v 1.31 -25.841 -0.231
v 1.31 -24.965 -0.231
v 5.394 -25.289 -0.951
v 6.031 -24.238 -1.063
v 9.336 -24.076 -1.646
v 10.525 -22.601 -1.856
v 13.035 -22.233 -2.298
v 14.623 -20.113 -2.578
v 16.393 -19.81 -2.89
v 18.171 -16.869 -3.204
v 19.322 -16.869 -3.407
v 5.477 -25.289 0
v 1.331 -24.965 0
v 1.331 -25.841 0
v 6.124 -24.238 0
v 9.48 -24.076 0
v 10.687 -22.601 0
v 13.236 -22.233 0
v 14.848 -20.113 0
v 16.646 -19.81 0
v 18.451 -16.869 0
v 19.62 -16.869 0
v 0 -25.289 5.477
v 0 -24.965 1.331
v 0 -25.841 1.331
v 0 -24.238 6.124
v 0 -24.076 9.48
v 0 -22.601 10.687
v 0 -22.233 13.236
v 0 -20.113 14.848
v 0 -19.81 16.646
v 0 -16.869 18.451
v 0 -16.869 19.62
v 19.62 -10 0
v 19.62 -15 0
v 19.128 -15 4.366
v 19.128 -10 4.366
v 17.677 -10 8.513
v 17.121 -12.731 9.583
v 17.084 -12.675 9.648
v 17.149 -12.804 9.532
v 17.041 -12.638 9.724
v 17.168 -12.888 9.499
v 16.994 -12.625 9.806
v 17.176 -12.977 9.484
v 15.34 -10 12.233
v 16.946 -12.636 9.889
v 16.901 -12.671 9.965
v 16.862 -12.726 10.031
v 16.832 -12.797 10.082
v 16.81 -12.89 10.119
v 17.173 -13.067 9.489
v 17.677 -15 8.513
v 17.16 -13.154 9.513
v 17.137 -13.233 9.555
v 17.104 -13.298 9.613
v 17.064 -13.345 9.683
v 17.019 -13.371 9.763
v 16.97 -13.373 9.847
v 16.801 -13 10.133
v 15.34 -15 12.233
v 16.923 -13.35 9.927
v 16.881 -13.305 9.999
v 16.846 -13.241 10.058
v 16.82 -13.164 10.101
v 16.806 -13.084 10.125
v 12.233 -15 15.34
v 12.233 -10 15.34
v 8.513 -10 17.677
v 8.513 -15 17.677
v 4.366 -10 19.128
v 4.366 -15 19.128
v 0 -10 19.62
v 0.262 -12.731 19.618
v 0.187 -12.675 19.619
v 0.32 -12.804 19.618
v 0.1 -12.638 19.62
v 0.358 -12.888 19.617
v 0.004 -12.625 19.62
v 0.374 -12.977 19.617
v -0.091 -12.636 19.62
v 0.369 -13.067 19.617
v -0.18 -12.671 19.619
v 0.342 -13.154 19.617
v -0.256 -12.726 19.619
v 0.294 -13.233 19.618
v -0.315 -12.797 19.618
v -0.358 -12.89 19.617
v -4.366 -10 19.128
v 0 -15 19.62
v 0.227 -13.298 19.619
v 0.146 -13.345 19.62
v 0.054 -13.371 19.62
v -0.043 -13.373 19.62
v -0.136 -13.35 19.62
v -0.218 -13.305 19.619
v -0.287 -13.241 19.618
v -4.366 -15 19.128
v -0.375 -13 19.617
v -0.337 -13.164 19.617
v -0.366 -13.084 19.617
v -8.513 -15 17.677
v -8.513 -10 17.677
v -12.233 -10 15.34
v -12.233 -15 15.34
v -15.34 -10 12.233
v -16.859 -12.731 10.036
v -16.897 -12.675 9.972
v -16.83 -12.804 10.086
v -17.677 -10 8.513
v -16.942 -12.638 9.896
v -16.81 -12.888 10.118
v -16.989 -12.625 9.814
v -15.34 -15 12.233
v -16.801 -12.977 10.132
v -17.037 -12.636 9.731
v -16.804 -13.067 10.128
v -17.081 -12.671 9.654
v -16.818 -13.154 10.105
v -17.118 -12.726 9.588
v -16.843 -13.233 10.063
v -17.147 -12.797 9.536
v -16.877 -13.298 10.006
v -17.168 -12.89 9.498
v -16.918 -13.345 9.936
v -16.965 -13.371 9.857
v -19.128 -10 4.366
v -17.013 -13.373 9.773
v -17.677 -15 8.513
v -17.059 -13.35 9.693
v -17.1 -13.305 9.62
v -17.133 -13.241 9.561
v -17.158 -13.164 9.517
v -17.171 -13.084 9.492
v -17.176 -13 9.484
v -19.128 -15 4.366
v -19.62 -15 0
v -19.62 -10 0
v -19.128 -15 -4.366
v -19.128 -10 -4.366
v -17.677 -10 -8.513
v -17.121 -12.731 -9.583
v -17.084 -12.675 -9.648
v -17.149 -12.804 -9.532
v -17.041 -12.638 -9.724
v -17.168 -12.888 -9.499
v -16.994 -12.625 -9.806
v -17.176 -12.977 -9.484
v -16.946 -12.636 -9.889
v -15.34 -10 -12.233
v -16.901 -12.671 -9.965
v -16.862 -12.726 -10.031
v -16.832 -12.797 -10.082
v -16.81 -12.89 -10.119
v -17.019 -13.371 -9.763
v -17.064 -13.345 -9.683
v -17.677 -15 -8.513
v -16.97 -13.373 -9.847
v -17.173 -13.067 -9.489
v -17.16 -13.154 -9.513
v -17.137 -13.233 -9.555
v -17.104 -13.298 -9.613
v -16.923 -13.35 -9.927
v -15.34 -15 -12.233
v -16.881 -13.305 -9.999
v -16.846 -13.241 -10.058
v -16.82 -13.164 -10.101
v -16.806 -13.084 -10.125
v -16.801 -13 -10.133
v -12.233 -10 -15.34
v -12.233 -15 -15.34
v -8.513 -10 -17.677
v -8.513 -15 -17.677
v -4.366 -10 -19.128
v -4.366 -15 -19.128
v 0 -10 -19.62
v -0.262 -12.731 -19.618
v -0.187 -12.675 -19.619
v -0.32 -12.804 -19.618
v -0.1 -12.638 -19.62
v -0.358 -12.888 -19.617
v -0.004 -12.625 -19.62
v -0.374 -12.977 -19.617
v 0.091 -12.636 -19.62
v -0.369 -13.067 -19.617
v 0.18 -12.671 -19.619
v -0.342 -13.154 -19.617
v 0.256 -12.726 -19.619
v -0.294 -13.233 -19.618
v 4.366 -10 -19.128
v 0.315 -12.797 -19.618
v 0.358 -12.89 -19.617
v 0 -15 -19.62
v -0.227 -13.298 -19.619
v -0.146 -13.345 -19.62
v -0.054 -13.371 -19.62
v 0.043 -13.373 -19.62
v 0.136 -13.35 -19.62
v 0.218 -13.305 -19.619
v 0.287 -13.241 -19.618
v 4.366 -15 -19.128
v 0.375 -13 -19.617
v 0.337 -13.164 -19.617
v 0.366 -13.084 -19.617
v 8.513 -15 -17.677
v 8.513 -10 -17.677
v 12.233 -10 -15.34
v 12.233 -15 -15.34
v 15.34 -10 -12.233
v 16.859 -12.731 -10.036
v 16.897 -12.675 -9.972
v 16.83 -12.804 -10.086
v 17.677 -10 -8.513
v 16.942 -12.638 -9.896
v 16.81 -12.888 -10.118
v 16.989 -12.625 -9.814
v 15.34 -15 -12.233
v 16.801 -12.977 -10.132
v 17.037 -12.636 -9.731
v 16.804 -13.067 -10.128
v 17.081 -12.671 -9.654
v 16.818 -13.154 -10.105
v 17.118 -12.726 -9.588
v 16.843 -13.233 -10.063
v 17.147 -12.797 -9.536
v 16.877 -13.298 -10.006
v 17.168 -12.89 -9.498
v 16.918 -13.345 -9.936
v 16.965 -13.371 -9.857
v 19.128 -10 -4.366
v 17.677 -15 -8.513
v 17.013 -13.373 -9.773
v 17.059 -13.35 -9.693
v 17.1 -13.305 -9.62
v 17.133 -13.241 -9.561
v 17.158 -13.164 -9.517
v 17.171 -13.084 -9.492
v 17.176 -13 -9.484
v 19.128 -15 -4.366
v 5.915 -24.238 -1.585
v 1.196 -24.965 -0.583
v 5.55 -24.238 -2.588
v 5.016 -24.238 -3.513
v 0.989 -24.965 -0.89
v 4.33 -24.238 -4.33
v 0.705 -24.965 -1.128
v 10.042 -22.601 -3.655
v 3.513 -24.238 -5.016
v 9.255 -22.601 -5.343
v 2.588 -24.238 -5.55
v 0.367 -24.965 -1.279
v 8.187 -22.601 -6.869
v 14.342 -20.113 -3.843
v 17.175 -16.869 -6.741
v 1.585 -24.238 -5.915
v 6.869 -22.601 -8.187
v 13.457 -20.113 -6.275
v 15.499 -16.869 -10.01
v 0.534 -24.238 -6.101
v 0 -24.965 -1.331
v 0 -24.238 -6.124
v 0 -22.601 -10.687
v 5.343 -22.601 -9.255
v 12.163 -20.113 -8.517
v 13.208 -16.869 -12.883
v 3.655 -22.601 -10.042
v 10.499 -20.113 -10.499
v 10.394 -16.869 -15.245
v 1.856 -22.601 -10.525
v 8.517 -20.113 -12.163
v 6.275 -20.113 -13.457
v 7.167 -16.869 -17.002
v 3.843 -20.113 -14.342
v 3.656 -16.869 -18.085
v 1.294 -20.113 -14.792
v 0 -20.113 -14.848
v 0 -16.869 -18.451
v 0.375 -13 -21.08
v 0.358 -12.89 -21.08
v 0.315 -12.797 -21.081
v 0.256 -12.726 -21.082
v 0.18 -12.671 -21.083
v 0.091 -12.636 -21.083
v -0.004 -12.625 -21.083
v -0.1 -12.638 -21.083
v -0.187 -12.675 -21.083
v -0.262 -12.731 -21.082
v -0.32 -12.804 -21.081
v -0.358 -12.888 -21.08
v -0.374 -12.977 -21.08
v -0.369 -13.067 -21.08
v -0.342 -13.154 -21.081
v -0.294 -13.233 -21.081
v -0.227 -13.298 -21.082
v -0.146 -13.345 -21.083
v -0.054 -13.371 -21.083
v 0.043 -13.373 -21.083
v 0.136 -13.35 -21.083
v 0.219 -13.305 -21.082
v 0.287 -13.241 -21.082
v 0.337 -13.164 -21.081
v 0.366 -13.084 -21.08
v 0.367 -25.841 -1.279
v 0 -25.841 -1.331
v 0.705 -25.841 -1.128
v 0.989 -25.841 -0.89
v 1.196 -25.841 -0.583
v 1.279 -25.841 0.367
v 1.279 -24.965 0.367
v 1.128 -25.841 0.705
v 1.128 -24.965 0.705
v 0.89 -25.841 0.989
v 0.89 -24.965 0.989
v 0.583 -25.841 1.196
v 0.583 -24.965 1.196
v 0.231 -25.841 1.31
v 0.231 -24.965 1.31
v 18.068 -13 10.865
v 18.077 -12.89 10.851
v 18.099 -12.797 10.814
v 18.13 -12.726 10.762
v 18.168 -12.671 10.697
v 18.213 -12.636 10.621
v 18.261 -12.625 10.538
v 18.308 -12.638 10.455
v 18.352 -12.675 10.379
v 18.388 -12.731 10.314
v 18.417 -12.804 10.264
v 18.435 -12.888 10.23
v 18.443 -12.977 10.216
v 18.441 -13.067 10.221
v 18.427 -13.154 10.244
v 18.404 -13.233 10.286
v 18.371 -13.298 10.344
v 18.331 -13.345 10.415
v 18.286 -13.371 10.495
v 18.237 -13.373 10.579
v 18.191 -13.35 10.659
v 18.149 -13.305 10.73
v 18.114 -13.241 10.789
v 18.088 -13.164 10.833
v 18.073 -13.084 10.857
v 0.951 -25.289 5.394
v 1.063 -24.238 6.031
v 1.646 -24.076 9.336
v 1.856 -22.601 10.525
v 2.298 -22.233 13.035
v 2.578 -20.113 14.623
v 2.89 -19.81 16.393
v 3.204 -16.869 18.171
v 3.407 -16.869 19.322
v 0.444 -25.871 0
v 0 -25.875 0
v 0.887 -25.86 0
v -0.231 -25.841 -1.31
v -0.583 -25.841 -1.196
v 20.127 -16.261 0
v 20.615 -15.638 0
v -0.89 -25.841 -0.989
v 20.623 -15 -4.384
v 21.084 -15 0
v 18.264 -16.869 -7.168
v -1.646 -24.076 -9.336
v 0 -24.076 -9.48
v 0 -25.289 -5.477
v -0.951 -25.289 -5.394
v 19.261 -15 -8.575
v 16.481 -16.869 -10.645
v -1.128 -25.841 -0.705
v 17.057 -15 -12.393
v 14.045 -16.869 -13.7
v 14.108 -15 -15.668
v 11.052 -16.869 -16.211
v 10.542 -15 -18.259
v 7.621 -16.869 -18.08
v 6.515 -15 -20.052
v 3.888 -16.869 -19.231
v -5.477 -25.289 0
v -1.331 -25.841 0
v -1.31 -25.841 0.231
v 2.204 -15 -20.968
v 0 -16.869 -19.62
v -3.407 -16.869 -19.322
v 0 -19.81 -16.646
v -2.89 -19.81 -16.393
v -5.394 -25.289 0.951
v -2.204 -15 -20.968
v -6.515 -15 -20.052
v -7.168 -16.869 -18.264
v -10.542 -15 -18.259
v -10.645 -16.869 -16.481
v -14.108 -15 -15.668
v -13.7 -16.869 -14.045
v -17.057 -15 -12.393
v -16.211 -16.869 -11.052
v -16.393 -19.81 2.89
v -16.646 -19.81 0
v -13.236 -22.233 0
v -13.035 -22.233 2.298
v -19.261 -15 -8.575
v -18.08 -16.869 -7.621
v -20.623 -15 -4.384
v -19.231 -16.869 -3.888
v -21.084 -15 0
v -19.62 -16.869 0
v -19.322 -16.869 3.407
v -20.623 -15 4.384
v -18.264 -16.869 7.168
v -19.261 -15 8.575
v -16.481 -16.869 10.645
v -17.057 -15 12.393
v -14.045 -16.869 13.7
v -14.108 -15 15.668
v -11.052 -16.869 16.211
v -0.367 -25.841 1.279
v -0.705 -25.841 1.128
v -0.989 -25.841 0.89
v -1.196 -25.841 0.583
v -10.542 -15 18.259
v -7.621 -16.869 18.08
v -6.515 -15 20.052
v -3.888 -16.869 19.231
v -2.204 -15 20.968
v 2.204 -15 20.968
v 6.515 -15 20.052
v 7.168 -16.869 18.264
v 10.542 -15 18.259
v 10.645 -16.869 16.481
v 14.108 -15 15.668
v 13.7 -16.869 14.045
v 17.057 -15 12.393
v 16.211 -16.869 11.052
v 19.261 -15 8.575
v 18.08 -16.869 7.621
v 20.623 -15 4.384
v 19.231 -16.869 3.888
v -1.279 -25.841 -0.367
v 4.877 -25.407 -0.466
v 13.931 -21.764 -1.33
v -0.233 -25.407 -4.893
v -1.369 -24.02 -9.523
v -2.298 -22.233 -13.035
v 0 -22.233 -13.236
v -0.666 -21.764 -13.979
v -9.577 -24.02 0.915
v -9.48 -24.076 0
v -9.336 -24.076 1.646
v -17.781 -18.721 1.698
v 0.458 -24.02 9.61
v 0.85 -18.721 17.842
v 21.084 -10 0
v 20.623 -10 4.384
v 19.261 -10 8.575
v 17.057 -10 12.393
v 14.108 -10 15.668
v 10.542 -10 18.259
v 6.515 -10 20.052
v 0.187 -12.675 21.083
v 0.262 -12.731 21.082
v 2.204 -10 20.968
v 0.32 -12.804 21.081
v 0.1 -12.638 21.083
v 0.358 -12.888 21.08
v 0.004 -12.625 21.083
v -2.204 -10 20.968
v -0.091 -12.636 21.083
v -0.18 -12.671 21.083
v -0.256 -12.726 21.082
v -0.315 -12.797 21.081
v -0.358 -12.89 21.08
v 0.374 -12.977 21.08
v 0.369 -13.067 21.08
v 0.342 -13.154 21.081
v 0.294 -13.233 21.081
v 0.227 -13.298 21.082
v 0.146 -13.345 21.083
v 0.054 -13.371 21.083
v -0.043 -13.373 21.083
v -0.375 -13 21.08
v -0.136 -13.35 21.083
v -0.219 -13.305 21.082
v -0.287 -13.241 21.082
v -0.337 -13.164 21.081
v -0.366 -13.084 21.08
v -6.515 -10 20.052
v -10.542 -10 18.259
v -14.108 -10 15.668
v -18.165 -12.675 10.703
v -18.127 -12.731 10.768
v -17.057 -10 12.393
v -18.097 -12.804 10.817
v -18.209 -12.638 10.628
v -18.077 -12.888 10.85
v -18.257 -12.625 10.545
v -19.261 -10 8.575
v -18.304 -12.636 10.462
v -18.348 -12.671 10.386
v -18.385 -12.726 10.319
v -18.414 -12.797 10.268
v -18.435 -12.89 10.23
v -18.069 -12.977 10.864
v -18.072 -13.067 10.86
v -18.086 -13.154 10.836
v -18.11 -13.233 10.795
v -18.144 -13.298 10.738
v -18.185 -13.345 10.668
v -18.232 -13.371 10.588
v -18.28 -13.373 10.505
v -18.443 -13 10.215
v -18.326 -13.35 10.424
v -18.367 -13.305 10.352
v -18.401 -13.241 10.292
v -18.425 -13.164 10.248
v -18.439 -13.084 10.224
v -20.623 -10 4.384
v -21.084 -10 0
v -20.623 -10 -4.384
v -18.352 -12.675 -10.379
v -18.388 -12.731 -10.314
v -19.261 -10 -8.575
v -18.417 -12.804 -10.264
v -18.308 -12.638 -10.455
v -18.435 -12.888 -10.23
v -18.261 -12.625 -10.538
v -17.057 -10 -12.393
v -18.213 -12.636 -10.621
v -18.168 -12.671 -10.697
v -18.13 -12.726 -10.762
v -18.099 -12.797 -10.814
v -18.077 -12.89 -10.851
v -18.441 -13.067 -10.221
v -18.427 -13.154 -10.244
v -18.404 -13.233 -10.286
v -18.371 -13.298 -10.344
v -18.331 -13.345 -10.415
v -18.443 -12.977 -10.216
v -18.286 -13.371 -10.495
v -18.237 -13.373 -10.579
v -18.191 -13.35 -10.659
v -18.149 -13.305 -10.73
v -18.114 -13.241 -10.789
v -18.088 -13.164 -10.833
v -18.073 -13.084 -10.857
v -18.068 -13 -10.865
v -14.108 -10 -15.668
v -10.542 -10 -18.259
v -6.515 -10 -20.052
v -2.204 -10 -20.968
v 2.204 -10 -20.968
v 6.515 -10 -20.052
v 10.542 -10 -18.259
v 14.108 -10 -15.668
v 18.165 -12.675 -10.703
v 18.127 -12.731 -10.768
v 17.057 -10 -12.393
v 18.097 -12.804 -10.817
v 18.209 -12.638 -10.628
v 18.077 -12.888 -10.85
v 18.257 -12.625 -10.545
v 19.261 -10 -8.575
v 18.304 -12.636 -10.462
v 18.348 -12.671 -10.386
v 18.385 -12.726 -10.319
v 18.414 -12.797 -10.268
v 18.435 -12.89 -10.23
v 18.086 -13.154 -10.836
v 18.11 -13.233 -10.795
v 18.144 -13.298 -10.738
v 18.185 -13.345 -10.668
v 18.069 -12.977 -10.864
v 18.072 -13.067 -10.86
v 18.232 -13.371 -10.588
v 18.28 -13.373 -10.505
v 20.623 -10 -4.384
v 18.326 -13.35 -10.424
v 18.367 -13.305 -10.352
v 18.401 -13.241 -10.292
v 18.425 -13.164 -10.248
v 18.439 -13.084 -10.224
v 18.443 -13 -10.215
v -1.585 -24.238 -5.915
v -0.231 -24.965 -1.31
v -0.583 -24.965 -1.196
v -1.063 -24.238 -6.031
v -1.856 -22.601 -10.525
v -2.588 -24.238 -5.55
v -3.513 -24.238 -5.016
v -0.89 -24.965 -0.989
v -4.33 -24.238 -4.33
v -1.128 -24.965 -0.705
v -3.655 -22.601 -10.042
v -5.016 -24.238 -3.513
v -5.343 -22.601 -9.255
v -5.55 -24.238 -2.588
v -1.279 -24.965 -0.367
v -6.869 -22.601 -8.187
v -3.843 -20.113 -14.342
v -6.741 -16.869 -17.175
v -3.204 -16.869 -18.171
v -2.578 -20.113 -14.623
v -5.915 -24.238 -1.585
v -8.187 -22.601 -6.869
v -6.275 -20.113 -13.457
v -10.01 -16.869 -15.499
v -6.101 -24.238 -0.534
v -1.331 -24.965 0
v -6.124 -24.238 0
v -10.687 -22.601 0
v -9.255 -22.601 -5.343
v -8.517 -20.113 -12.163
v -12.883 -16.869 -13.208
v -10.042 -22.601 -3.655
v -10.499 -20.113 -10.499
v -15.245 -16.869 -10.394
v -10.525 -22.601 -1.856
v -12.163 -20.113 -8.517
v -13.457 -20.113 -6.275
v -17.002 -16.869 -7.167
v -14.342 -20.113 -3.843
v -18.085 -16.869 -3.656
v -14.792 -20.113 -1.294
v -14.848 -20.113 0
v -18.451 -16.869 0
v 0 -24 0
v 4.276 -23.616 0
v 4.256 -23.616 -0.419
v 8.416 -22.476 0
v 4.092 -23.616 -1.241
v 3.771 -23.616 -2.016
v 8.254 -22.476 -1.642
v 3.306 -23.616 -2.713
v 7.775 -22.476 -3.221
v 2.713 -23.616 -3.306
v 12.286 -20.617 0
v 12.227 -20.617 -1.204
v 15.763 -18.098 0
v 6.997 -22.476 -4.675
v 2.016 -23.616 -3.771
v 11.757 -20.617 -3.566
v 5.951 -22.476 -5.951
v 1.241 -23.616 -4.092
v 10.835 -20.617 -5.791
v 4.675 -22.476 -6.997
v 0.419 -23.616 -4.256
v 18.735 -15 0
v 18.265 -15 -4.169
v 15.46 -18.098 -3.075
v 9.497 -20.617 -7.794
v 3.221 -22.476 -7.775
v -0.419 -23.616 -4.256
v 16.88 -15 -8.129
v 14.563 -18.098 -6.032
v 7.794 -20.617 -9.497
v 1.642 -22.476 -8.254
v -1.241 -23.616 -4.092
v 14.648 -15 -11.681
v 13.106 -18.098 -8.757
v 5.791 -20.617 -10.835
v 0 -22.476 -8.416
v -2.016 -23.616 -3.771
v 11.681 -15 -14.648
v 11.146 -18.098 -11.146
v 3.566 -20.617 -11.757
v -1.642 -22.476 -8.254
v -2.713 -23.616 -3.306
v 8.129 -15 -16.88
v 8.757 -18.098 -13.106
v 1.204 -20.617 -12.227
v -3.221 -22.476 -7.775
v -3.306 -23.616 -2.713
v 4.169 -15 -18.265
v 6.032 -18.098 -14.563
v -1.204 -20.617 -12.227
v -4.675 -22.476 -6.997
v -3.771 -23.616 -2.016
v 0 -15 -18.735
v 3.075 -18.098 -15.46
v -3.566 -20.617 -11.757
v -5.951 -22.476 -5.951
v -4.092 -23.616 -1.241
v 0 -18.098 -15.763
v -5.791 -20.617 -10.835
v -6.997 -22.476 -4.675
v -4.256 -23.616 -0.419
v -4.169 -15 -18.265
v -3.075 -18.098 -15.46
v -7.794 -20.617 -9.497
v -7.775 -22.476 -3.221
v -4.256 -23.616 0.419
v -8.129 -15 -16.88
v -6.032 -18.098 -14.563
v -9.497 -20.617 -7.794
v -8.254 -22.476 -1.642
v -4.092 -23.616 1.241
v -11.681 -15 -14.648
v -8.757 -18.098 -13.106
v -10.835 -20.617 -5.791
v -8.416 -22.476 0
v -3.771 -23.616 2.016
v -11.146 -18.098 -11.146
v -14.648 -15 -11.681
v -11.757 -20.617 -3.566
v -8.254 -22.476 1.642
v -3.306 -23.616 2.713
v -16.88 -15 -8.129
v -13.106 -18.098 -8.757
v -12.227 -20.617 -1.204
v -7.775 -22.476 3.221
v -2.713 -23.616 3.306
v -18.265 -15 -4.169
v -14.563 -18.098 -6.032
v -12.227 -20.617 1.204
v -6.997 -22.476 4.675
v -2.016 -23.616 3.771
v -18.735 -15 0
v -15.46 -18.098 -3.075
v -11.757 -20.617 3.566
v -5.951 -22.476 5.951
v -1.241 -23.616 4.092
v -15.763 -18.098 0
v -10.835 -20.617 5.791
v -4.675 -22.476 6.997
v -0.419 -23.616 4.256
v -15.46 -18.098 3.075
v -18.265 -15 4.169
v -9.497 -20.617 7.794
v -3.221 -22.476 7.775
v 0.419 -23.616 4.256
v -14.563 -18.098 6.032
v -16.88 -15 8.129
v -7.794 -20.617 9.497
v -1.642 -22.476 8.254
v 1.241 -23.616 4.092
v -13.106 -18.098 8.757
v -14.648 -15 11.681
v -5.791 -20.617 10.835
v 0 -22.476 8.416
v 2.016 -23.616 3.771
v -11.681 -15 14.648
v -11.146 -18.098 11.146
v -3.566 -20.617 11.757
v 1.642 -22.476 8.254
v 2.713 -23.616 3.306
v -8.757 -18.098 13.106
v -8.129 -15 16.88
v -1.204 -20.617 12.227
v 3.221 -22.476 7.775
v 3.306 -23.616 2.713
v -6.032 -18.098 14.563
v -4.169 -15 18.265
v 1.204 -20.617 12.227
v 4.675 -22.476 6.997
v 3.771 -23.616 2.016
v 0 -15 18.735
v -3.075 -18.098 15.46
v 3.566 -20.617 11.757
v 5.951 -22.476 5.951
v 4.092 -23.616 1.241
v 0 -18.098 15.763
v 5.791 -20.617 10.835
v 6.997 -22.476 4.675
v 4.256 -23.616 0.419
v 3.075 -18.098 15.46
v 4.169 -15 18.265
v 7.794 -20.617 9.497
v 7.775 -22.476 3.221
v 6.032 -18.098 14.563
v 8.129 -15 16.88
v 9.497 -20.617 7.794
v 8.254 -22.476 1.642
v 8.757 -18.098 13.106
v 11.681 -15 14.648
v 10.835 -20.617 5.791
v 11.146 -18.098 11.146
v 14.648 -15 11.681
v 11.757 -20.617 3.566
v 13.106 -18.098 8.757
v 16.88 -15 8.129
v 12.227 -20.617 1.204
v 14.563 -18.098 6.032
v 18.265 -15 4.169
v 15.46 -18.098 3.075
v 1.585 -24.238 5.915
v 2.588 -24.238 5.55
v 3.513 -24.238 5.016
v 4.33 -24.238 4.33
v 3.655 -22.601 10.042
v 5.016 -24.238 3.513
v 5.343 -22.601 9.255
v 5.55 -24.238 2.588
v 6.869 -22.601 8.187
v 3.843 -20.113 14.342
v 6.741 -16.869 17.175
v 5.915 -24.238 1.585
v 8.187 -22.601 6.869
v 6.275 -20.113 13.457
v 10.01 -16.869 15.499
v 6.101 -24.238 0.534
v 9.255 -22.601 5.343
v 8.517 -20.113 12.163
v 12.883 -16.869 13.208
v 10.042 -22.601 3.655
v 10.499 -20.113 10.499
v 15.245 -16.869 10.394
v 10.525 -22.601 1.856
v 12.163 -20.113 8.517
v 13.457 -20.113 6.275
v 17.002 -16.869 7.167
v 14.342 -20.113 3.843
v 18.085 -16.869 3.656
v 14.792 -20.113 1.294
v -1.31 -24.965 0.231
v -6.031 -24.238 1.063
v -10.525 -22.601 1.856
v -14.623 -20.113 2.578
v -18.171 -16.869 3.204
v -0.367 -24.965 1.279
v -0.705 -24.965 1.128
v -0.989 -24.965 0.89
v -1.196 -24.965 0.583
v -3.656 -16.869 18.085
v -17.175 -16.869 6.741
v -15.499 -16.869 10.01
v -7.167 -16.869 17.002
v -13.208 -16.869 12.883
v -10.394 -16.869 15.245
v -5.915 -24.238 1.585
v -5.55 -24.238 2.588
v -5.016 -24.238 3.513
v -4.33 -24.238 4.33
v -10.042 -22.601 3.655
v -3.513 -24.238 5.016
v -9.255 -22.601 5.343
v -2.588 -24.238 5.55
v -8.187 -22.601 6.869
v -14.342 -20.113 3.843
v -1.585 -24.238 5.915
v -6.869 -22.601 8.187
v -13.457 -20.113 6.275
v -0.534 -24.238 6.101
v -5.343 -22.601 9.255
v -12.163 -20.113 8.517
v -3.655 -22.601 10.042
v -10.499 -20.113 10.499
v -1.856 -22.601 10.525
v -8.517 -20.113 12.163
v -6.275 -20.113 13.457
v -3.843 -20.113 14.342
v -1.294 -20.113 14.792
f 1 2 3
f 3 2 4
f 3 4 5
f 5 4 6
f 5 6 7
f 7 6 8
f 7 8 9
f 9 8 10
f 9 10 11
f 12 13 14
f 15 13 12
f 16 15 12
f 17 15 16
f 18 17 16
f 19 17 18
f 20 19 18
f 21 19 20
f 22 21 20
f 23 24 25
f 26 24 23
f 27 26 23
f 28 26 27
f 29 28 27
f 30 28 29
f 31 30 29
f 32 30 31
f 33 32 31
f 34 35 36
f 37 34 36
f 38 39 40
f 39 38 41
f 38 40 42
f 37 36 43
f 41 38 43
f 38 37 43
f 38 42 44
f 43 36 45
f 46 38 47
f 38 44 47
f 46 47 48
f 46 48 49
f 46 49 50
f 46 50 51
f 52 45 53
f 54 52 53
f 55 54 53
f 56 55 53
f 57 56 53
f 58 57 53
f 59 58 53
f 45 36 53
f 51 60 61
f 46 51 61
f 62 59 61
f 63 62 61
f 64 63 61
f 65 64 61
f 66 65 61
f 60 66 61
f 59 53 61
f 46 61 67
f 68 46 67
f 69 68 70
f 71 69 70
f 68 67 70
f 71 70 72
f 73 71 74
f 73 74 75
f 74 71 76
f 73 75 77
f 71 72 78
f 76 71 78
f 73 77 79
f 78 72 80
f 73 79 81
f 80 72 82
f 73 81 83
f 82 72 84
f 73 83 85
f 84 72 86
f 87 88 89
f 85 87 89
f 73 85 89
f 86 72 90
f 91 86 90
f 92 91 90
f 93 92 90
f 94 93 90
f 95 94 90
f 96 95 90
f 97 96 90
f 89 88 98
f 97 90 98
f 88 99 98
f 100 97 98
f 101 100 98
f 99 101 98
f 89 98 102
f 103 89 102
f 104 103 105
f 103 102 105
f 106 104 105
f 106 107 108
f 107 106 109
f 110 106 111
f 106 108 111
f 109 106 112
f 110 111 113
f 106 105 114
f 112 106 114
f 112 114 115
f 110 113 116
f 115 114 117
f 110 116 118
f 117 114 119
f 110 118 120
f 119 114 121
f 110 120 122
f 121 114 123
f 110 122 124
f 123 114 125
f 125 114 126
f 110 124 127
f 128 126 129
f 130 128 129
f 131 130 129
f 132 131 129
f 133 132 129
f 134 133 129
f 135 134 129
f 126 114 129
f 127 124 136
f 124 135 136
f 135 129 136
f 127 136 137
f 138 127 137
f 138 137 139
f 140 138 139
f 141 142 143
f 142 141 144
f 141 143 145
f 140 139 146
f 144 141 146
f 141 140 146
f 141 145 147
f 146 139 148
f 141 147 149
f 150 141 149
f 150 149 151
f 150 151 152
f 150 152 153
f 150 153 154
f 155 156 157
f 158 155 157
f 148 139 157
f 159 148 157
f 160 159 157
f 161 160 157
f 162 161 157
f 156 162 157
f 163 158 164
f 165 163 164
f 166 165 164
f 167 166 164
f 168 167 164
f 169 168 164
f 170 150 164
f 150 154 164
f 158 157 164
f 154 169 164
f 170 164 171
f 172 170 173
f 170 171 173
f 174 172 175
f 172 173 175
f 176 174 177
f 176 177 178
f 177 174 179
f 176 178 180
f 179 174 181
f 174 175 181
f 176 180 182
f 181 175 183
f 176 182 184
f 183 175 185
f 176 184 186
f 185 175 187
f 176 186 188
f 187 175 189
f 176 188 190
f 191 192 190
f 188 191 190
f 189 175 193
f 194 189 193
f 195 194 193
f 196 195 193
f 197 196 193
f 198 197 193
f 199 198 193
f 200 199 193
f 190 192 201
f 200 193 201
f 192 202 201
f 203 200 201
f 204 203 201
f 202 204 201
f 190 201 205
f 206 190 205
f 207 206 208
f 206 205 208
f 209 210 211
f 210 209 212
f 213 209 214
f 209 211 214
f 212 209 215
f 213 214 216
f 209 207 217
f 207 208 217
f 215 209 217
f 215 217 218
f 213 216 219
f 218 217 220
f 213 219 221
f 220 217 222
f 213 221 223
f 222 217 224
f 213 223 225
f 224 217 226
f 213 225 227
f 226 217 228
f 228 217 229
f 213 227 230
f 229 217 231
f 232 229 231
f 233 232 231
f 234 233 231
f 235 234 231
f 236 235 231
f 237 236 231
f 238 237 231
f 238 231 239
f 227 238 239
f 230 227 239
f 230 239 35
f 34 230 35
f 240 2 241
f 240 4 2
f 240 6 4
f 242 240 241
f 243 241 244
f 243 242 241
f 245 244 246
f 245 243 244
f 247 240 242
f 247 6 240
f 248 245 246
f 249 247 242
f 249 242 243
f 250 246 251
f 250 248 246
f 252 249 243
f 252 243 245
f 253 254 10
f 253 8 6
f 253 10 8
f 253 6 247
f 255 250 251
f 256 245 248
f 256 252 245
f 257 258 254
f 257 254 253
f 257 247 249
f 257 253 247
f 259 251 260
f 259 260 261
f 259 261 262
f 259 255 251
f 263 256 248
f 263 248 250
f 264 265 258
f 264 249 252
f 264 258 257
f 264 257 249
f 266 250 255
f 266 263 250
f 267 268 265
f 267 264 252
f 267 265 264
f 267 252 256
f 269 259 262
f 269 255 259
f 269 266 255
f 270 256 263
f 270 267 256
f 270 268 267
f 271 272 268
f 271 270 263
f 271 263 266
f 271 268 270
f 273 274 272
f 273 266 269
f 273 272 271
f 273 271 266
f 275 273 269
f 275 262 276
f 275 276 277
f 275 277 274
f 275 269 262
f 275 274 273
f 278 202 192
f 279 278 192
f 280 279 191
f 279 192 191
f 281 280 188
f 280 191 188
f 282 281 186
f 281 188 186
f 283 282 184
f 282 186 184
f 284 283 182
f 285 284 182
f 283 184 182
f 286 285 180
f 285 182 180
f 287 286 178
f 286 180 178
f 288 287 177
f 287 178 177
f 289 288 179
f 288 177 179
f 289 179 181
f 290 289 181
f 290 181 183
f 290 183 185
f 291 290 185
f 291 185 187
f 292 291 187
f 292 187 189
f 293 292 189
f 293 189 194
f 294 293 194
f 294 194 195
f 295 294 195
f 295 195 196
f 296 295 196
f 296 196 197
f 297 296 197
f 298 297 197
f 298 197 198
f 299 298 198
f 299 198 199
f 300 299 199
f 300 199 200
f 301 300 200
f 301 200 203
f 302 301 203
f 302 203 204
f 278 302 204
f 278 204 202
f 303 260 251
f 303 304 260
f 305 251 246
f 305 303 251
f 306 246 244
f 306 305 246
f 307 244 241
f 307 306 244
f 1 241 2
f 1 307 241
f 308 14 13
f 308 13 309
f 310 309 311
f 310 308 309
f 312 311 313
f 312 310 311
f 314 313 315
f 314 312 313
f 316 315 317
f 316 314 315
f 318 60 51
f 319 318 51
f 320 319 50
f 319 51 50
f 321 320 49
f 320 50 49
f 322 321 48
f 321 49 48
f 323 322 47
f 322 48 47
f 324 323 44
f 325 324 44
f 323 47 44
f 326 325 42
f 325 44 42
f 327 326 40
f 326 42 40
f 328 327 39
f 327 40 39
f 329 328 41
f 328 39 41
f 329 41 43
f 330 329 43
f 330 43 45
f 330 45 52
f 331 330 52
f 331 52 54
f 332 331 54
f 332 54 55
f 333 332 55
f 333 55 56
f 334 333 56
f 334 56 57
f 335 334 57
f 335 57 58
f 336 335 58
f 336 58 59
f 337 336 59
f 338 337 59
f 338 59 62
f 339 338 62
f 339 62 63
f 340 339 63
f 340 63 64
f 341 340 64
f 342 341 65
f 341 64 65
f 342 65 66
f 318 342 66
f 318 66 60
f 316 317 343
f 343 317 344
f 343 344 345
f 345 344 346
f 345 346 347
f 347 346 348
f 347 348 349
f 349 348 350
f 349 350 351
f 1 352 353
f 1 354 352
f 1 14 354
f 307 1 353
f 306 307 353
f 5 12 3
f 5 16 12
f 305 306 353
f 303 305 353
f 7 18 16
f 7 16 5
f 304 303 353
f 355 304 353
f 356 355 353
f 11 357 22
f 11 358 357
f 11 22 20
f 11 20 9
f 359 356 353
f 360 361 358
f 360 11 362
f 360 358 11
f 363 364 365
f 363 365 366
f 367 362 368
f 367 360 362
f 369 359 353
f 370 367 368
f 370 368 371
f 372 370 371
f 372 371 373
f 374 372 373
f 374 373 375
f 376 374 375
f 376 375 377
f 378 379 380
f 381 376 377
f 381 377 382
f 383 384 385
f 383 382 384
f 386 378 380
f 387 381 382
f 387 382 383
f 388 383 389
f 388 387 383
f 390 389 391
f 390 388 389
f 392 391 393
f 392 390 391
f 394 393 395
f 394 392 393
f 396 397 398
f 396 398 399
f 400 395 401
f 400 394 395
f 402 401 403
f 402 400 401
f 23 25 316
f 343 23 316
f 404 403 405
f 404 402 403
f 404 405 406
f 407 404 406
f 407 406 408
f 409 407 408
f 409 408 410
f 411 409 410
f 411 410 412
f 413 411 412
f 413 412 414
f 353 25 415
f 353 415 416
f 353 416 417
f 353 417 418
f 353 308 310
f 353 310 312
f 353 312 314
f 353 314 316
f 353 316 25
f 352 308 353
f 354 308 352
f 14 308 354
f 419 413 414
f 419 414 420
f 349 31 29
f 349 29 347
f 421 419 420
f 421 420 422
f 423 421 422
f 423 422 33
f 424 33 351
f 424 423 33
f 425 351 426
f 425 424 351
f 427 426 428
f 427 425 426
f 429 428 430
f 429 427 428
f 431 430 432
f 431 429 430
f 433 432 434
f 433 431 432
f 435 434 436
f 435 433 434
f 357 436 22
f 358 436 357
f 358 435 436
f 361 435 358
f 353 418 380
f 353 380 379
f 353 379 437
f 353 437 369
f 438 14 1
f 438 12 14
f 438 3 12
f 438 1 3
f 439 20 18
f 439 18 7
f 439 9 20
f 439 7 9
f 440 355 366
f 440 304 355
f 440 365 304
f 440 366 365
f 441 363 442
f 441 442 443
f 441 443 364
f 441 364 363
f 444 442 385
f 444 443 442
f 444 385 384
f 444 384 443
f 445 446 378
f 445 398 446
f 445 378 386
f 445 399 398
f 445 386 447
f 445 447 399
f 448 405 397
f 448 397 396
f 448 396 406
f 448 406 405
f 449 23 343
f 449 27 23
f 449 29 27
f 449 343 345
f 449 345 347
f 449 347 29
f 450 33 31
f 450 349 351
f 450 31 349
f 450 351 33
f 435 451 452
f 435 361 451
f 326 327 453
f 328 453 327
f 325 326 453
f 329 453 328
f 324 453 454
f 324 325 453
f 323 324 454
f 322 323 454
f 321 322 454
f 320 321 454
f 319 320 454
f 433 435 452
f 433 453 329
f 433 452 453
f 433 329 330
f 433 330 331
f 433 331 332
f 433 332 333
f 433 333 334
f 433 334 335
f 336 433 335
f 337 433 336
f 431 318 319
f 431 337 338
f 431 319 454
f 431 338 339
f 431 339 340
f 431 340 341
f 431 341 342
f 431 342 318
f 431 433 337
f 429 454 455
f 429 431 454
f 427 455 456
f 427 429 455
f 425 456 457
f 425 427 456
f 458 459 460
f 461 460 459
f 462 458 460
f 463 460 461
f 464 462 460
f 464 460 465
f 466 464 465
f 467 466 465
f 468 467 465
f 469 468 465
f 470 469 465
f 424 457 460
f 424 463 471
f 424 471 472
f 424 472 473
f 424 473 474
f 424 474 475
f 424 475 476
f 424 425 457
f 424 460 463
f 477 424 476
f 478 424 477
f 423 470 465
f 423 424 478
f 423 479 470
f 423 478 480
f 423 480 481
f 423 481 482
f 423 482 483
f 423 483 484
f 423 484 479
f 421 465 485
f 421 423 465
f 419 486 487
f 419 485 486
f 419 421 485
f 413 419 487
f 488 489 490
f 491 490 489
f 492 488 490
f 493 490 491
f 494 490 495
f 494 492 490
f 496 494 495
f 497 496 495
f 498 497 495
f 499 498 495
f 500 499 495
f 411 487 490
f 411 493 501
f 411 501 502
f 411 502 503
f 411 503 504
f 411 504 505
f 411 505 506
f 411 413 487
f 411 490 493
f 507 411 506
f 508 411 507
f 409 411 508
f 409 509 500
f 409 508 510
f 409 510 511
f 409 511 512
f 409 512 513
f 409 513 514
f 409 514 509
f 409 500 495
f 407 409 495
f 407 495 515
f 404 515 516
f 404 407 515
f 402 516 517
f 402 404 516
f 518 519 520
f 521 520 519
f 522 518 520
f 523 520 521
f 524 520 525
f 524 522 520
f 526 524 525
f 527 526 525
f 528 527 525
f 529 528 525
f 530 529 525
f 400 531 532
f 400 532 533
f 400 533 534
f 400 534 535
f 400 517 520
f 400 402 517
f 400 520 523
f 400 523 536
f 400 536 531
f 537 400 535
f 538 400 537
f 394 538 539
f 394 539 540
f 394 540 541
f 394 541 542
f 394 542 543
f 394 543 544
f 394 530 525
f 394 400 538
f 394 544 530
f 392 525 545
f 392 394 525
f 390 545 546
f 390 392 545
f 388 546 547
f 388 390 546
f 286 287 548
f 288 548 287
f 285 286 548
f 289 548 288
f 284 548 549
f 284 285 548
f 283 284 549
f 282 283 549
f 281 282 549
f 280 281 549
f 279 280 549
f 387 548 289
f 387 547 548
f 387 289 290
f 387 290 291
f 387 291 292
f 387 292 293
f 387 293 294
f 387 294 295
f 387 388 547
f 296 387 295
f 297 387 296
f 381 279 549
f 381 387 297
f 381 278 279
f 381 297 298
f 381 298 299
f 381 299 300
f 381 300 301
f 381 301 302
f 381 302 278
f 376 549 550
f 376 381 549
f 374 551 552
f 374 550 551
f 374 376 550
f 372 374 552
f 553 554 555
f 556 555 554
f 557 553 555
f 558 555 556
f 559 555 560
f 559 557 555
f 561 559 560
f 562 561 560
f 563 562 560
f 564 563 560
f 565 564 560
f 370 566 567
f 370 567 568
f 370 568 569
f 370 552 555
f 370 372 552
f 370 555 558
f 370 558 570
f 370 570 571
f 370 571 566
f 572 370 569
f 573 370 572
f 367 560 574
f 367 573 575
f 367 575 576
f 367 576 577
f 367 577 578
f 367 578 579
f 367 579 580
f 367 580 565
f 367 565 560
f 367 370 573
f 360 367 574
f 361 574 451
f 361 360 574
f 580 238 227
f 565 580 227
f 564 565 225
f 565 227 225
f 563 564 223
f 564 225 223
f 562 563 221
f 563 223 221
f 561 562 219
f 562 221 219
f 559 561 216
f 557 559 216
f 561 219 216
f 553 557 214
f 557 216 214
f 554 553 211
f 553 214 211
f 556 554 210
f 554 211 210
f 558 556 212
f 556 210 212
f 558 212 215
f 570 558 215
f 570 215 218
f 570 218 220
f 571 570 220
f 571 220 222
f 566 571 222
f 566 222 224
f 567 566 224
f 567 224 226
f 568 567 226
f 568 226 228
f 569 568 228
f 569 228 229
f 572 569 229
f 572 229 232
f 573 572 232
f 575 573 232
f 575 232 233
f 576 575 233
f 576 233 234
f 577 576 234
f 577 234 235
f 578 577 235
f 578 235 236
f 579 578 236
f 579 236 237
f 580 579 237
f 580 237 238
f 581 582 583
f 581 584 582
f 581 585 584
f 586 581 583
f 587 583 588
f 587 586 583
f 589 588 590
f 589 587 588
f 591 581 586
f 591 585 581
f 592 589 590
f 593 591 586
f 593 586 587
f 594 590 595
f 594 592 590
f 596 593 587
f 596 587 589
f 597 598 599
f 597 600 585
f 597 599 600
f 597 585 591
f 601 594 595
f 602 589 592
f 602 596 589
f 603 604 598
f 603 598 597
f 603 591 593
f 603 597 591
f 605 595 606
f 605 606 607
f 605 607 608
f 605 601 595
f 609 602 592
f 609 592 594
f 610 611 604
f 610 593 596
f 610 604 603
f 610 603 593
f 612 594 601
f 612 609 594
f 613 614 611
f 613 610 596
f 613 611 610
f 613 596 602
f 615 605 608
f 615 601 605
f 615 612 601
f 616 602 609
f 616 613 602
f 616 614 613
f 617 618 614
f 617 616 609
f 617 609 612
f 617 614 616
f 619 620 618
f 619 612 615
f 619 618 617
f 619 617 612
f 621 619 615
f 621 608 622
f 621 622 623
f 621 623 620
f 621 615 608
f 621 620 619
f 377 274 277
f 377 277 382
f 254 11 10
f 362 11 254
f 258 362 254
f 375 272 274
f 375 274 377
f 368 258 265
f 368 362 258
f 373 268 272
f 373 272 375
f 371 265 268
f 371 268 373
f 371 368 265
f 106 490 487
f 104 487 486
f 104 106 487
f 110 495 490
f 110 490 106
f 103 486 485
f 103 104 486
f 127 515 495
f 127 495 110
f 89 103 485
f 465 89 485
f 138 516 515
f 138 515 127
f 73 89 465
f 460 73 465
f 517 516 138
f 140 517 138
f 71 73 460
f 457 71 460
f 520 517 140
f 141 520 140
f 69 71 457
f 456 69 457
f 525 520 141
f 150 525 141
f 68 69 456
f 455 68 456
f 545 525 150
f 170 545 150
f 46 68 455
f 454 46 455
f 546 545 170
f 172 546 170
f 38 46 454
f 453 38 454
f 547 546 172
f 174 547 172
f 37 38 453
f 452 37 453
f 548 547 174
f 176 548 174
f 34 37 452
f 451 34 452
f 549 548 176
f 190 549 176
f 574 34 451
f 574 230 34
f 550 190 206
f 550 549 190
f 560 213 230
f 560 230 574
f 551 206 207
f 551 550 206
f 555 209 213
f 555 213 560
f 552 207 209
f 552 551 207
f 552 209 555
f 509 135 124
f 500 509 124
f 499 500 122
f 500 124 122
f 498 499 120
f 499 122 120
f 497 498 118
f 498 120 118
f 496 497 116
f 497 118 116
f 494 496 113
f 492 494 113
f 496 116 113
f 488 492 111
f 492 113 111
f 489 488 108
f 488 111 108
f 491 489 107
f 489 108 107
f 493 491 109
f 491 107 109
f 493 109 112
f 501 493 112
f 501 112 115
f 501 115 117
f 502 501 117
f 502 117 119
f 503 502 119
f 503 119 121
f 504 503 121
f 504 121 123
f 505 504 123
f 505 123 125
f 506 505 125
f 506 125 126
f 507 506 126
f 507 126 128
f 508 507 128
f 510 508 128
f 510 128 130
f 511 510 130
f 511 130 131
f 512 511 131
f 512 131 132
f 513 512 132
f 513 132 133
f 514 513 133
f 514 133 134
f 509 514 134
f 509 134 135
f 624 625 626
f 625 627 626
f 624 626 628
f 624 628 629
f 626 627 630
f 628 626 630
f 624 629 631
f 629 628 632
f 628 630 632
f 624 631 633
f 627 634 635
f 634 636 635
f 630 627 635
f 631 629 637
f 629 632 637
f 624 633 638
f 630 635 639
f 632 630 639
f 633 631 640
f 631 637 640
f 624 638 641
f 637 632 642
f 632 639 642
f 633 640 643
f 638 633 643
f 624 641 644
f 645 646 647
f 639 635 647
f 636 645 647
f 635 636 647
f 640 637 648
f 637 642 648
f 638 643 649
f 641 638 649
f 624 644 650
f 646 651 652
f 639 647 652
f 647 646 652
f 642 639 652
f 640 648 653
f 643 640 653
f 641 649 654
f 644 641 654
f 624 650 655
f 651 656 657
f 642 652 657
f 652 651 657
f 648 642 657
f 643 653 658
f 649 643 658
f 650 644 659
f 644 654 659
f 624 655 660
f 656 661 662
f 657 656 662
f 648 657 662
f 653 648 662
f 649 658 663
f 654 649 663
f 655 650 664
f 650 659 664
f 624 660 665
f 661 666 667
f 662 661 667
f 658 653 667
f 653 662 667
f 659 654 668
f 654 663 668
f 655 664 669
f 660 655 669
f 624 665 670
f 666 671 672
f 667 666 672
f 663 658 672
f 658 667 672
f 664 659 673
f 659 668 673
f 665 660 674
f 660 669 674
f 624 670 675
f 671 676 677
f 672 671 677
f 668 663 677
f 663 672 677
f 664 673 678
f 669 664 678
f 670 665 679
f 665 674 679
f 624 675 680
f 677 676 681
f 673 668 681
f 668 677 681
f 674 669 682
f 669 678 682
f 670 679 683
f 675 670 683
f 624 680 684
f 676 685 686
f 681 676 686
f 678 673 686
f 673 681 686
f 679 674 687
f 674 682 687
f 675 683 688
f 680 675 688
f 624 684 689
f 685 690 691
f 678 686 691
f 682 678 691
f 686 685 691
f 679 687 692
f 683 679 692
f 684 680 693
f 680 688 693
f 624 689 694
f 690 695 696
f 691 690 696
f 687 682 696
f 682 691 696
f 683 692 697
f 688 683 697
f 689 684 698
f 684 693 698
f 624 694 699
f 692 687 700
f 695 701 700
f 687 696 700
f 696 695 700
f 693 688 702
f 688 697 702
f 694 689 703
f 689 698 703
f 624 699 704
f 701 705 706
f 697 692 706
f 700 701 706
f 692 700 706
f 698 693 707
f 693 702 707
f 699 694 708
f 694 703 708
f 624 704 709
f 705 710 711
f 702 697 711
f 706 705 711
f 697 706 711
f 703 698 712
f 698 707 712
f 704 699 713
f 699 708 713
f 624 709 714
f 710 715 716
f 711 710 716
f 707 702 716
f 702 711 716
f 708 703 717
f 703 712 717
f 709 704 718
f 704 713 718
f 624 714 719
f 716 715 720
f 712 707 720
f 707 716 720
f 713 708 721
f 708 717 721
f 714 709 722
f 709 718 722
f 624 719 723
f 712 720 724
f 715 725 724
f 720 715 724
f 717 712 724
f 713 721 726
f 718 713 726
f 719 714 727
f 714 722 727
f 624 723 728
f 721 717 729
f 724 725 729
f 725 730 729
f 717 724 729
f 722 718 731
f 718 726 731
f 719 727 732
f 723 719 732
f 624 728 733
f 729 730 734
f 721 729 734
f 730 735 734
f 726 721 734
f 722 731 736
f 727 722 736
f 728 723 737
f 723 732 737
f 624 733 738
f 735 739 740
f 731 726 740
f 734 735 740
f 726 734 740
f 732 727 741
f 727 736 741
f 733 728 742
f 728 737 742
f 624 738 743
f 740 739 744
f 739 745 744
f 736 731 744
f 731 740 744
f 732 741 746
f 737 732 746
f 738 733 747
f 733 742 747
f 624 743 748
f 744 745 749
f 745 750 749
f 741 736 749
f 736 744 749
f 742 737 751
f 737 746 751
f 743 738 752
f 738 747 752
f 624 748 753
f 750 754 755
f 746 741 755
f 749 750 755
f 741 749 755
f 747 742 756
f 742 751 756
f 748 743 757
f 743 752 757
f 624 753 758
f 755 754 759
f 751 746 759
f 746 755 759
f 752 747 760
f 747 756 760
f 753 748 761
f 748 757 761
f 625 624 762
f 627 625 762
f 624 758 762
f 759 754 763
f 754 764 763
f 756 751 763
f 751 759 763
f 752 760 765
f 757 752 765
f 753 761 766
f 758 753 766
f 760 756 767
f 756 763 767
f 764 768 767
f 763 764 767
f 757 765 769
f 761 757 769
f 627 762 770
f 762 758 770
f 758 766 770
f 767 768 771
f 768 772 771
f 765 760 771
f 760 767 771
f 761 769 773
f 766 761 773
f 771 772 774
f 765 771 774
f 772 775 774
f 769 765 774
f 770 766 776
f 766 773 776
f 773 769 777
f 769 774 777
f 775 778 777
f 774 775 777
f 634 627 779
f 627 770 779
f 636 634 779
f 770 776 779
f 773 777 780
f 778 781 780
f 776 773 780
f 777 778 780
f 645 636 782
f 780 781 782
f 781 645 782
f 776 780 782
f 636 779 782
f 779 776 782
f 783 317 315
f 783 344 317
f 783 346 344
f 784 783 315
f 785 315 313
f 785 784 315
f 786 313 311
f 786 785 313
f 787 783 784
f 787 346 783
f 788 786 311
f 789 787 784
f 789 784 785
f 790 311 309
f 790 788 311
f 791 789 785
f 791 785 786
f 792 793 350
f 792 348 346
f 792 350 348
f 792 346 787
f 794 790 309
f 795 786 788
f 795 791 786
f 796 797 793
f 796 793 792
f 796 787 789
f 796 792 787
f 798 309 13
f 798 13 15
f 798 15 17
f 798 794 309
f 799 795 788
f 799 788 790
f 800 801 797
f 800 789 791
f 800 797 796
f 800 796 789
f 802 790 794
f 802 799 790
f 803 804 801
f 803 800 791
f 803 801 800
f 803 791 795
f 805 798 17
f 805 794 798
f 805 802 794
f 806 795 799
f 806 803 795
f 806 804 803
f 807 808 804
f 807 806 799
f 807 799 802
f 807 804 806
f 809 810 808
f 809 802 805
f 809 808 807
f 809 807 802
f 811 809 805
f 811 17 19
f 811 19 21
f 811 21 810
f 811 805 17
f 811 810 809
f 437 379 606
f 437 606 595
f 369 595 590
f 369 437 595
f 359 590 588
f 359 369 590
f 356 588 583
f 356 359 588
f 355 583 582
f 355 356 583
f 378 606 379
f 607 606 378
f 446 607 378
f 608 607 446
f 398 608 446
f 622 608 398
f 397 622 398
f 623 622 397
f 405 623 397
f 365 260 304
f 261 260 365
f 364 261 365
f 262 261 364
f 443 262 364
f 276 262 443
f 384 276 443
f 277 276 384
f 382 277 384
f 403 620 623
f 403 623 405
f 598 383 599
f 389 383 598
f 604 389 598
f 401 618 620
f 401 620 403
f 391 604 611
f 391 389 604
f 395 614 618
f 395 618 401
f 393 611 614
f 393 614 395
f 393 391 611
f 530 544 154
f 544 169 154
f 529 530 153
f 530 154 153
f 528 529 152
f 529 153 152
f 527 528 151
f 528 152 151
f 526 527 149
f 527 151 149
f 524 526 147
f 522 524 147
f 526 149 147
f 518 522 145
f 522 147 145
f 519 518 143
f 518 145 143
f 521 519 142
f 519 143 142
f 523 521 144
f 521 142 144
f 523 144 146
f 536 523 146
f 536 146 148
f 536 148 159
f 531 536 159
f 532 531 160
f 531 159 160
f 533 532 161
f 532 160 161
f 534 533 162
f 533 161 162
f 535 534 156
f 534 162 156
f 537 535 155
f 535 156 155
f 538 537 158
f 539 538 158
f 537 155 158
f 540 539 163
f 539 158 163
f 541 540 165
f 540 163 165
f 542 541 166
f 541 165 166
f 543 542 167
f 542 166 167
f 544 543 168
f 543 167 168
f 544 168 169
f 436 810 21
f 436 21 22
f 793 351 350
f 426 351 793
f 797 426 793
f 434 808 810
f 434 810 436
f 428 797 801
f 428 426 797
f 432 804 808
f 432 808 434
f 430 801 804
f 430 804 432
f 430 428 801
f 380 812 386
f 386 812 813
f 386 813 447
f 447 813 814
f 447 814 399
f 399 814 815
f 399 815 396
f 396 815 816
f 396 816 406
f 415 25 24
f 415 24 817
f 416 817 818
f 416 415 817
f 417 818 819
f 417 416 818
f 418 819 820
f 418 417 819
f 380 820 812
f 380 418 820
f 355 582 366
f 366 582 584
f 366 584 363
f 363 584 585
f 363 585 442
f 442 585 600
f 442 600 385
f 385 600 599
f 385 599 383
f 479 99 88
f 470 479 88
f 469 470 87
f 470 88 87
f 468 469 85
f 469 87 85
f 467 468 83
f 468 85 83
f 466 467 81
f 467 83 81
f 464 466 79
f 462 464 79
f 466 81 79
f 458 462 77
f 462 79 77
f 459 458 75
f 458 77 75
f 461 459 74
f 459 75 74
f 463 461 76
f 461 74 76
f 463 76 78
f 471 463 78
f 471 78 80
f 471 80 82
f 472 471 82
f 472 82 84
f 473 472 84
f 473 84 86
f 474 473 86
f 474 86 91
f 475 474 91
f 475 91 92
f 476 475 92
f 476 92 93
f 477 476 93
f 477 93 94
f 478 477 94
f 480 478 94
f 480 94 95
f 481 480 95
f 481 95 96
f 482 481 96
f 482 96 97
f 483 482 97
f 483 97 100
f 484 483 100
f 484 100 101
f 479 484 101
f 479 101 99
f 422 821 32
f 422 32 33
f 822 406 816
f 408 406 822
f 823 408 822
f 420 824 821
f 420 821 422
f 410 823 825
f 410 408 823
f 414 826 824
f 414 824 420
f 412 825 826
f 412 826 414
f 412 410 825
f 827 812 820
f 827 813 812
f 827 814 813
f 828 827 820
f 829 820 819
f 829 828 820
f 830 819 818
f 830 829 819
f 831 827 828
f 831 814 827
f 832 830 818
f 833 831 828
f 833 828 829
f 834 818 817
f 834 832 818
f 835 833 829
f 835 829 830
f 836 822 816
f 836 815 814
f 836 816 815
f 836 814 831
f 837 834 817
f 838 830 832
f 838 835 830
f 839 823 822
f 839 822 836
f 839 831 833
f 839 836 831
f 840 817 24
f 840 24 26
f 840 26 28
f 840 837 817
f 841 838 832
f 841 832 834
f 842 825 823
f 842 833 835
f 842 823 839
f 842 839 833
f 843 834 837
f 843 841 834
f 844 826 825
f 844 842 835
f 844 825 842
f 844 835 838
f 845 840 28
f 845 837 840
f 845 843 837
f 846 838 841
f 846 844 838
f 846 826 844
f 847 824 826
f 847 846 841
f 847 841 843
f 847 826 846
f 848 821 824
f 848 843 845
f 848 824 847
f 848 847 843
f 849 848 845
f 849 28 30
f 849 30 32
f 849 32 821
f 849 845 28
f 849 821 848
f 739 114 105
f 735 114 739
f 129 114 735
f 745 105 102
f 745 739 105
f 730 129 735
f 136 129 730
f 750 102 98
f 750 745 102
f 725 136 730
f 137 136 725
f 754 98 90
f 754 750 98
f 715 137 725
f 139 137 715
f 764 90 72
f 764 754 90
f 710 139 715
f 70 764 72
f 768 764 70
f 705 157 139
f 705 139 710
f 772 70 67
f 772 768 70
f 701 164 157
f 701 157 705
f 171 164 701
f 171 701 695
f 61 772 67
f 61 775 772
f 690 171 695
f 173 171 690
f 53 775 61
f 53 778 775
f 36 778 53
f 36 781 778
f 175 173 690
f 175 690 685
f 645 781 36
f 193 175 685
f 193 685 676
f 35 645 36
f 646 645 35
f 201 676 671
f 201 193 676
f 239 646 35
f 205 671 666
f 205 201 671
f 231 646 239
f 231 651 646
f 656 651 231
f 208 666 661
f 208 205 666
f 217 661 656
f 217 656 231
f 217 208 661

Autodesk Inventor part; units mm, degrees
ref_plane "YZ Plane" through (0, 0, 0) normal (1, 0, 0) x (0, 1, 0)
ref_plane "XZ Plane" through (0, 0, 0) normal (0, 1, 0) x (-1, 0, 0)
ref_plane "XY Plane" through (0, 0, 0) normal (0, 0, 1) x (1, 0, 0)
sketch "Sketch2" plane through (0, 0, 0) normal (0, 0, 1) x (1, 0, 0)
  circle A0 centre (0, 0) radius 25
  circle A1 centre (0, 0) radius 24
  line L0 (-28.1544, -15) -> (30.7149, -15)
  line L1 (0, -25) -> (0, -24)
  point P0 (20, -15)
  point P1 (18.735, -15)
  dimension "d3" = 50
  dimension "d4" = 48
  dimension "d6" = 10
revolve "Revolution1" add sketch "Sketch2" angle 360 about axis through (0, -25, 0) along (0, 1, 0) picked at (16.5634, -17.6598) contours A0 L1 A1 L0
sketch "Sketch3" plane through (0, 0, 0) normal (0, 0, 1) x (1, 0, 0)
  arc A0 (-20, -15) -> (20, -15) centre (0, 0) ccw projected
  circle A1 centre (0, 0) radius 25
  circle A2 centre (0, 0) radius 25.875
  line L0 (20, -15) -> (21.0835, -15)
  line L1 (-20, -15) -> (20, -15) projected
  line L2 (0, -15) -> (0, -25)
  line L3 (-20, -15) -> (-21.0835, -15)
  line L4 (0, -25.875) -> (0, -25)
  line L5 (-38.5, 0) -> (38.5, 0) projected
  line L6 (0, -38.5) -> (0, 38.5) projected
  point P0 (20, -15)
  dimension "d7" = 51.75
revolve "Revolution2" add sketch "Sketch3" angle 360 about axis through (0, -10, 0) along (0, 1, 0) contours A0 L0 A2 L4
sketch "Sketch4" plane through (0, 0, 0) normal (0, 0, 1) x (1, 0, 0)
  line L0 (19.6202, -16.869) -> (18.4509, -16.869)
  line L1 (0, -25.875) -> (0, -25)
  line L2 (1.3306, -24.9646) -> (1.3306, -25.8408)
  line L3 (-19.6202, -16.869) -> (-18.4509, -16.869)
  line L4 (-1.3306, -24.9646) -> (-1.3306, -25.8408)
  circle A0 centre (0, 0) radius 25
  circle A1 centre (0, 0) radius 25.875
  line L5 (0, -36.225) -> (0, 36.225) projected
revolve "Revolution4" cut sketch "Sketch4" angle 80 about axis through (0, -10, 0) along (0, -1, 0) contours A1 L2 A0 L0
pattern_circular "Circular Pattern2" count 4 over 360 about axis through (0, -10, 0) along (0, 1, 0) of "Revolution4"
sketch "Sketch6" plane through (0, -15, 0) normal (0, 1, 0) x (1, 0, 0)
  line L0 (-19.6202, 0) -> (-1.3306, 0) projected
  circle A0 centre (0, 0) radius 19.6202
  circle A1 centre (0, 0) radius 21.0835 projected
  circle A2 centre (0, 0) radius 21.0835
extrude "Extrusion3" add sketch "Sketch6" along normal blind 5
sketch "Sketch7" plane through (0, 0, 0) normal (0, 0, 1) x (1, 0, 0)
  line L0 (-21.0835, -15) -> (21.0835, -15) projected
  circle A0 centre (0, -13) radius 0.375
  point P0 (0, 0)
  dimension "d24" = 0.75
  dimension "d26" = 2
extrude "Extrusion4" cut sketch "Sketch7" against normal through all
pattern_circular "Circular Pattern3" count 6 over 360 about axis through (0, -10, 0) along (0, 1, 0) of "Extrusion4"
properties part number "Main Mirror"
